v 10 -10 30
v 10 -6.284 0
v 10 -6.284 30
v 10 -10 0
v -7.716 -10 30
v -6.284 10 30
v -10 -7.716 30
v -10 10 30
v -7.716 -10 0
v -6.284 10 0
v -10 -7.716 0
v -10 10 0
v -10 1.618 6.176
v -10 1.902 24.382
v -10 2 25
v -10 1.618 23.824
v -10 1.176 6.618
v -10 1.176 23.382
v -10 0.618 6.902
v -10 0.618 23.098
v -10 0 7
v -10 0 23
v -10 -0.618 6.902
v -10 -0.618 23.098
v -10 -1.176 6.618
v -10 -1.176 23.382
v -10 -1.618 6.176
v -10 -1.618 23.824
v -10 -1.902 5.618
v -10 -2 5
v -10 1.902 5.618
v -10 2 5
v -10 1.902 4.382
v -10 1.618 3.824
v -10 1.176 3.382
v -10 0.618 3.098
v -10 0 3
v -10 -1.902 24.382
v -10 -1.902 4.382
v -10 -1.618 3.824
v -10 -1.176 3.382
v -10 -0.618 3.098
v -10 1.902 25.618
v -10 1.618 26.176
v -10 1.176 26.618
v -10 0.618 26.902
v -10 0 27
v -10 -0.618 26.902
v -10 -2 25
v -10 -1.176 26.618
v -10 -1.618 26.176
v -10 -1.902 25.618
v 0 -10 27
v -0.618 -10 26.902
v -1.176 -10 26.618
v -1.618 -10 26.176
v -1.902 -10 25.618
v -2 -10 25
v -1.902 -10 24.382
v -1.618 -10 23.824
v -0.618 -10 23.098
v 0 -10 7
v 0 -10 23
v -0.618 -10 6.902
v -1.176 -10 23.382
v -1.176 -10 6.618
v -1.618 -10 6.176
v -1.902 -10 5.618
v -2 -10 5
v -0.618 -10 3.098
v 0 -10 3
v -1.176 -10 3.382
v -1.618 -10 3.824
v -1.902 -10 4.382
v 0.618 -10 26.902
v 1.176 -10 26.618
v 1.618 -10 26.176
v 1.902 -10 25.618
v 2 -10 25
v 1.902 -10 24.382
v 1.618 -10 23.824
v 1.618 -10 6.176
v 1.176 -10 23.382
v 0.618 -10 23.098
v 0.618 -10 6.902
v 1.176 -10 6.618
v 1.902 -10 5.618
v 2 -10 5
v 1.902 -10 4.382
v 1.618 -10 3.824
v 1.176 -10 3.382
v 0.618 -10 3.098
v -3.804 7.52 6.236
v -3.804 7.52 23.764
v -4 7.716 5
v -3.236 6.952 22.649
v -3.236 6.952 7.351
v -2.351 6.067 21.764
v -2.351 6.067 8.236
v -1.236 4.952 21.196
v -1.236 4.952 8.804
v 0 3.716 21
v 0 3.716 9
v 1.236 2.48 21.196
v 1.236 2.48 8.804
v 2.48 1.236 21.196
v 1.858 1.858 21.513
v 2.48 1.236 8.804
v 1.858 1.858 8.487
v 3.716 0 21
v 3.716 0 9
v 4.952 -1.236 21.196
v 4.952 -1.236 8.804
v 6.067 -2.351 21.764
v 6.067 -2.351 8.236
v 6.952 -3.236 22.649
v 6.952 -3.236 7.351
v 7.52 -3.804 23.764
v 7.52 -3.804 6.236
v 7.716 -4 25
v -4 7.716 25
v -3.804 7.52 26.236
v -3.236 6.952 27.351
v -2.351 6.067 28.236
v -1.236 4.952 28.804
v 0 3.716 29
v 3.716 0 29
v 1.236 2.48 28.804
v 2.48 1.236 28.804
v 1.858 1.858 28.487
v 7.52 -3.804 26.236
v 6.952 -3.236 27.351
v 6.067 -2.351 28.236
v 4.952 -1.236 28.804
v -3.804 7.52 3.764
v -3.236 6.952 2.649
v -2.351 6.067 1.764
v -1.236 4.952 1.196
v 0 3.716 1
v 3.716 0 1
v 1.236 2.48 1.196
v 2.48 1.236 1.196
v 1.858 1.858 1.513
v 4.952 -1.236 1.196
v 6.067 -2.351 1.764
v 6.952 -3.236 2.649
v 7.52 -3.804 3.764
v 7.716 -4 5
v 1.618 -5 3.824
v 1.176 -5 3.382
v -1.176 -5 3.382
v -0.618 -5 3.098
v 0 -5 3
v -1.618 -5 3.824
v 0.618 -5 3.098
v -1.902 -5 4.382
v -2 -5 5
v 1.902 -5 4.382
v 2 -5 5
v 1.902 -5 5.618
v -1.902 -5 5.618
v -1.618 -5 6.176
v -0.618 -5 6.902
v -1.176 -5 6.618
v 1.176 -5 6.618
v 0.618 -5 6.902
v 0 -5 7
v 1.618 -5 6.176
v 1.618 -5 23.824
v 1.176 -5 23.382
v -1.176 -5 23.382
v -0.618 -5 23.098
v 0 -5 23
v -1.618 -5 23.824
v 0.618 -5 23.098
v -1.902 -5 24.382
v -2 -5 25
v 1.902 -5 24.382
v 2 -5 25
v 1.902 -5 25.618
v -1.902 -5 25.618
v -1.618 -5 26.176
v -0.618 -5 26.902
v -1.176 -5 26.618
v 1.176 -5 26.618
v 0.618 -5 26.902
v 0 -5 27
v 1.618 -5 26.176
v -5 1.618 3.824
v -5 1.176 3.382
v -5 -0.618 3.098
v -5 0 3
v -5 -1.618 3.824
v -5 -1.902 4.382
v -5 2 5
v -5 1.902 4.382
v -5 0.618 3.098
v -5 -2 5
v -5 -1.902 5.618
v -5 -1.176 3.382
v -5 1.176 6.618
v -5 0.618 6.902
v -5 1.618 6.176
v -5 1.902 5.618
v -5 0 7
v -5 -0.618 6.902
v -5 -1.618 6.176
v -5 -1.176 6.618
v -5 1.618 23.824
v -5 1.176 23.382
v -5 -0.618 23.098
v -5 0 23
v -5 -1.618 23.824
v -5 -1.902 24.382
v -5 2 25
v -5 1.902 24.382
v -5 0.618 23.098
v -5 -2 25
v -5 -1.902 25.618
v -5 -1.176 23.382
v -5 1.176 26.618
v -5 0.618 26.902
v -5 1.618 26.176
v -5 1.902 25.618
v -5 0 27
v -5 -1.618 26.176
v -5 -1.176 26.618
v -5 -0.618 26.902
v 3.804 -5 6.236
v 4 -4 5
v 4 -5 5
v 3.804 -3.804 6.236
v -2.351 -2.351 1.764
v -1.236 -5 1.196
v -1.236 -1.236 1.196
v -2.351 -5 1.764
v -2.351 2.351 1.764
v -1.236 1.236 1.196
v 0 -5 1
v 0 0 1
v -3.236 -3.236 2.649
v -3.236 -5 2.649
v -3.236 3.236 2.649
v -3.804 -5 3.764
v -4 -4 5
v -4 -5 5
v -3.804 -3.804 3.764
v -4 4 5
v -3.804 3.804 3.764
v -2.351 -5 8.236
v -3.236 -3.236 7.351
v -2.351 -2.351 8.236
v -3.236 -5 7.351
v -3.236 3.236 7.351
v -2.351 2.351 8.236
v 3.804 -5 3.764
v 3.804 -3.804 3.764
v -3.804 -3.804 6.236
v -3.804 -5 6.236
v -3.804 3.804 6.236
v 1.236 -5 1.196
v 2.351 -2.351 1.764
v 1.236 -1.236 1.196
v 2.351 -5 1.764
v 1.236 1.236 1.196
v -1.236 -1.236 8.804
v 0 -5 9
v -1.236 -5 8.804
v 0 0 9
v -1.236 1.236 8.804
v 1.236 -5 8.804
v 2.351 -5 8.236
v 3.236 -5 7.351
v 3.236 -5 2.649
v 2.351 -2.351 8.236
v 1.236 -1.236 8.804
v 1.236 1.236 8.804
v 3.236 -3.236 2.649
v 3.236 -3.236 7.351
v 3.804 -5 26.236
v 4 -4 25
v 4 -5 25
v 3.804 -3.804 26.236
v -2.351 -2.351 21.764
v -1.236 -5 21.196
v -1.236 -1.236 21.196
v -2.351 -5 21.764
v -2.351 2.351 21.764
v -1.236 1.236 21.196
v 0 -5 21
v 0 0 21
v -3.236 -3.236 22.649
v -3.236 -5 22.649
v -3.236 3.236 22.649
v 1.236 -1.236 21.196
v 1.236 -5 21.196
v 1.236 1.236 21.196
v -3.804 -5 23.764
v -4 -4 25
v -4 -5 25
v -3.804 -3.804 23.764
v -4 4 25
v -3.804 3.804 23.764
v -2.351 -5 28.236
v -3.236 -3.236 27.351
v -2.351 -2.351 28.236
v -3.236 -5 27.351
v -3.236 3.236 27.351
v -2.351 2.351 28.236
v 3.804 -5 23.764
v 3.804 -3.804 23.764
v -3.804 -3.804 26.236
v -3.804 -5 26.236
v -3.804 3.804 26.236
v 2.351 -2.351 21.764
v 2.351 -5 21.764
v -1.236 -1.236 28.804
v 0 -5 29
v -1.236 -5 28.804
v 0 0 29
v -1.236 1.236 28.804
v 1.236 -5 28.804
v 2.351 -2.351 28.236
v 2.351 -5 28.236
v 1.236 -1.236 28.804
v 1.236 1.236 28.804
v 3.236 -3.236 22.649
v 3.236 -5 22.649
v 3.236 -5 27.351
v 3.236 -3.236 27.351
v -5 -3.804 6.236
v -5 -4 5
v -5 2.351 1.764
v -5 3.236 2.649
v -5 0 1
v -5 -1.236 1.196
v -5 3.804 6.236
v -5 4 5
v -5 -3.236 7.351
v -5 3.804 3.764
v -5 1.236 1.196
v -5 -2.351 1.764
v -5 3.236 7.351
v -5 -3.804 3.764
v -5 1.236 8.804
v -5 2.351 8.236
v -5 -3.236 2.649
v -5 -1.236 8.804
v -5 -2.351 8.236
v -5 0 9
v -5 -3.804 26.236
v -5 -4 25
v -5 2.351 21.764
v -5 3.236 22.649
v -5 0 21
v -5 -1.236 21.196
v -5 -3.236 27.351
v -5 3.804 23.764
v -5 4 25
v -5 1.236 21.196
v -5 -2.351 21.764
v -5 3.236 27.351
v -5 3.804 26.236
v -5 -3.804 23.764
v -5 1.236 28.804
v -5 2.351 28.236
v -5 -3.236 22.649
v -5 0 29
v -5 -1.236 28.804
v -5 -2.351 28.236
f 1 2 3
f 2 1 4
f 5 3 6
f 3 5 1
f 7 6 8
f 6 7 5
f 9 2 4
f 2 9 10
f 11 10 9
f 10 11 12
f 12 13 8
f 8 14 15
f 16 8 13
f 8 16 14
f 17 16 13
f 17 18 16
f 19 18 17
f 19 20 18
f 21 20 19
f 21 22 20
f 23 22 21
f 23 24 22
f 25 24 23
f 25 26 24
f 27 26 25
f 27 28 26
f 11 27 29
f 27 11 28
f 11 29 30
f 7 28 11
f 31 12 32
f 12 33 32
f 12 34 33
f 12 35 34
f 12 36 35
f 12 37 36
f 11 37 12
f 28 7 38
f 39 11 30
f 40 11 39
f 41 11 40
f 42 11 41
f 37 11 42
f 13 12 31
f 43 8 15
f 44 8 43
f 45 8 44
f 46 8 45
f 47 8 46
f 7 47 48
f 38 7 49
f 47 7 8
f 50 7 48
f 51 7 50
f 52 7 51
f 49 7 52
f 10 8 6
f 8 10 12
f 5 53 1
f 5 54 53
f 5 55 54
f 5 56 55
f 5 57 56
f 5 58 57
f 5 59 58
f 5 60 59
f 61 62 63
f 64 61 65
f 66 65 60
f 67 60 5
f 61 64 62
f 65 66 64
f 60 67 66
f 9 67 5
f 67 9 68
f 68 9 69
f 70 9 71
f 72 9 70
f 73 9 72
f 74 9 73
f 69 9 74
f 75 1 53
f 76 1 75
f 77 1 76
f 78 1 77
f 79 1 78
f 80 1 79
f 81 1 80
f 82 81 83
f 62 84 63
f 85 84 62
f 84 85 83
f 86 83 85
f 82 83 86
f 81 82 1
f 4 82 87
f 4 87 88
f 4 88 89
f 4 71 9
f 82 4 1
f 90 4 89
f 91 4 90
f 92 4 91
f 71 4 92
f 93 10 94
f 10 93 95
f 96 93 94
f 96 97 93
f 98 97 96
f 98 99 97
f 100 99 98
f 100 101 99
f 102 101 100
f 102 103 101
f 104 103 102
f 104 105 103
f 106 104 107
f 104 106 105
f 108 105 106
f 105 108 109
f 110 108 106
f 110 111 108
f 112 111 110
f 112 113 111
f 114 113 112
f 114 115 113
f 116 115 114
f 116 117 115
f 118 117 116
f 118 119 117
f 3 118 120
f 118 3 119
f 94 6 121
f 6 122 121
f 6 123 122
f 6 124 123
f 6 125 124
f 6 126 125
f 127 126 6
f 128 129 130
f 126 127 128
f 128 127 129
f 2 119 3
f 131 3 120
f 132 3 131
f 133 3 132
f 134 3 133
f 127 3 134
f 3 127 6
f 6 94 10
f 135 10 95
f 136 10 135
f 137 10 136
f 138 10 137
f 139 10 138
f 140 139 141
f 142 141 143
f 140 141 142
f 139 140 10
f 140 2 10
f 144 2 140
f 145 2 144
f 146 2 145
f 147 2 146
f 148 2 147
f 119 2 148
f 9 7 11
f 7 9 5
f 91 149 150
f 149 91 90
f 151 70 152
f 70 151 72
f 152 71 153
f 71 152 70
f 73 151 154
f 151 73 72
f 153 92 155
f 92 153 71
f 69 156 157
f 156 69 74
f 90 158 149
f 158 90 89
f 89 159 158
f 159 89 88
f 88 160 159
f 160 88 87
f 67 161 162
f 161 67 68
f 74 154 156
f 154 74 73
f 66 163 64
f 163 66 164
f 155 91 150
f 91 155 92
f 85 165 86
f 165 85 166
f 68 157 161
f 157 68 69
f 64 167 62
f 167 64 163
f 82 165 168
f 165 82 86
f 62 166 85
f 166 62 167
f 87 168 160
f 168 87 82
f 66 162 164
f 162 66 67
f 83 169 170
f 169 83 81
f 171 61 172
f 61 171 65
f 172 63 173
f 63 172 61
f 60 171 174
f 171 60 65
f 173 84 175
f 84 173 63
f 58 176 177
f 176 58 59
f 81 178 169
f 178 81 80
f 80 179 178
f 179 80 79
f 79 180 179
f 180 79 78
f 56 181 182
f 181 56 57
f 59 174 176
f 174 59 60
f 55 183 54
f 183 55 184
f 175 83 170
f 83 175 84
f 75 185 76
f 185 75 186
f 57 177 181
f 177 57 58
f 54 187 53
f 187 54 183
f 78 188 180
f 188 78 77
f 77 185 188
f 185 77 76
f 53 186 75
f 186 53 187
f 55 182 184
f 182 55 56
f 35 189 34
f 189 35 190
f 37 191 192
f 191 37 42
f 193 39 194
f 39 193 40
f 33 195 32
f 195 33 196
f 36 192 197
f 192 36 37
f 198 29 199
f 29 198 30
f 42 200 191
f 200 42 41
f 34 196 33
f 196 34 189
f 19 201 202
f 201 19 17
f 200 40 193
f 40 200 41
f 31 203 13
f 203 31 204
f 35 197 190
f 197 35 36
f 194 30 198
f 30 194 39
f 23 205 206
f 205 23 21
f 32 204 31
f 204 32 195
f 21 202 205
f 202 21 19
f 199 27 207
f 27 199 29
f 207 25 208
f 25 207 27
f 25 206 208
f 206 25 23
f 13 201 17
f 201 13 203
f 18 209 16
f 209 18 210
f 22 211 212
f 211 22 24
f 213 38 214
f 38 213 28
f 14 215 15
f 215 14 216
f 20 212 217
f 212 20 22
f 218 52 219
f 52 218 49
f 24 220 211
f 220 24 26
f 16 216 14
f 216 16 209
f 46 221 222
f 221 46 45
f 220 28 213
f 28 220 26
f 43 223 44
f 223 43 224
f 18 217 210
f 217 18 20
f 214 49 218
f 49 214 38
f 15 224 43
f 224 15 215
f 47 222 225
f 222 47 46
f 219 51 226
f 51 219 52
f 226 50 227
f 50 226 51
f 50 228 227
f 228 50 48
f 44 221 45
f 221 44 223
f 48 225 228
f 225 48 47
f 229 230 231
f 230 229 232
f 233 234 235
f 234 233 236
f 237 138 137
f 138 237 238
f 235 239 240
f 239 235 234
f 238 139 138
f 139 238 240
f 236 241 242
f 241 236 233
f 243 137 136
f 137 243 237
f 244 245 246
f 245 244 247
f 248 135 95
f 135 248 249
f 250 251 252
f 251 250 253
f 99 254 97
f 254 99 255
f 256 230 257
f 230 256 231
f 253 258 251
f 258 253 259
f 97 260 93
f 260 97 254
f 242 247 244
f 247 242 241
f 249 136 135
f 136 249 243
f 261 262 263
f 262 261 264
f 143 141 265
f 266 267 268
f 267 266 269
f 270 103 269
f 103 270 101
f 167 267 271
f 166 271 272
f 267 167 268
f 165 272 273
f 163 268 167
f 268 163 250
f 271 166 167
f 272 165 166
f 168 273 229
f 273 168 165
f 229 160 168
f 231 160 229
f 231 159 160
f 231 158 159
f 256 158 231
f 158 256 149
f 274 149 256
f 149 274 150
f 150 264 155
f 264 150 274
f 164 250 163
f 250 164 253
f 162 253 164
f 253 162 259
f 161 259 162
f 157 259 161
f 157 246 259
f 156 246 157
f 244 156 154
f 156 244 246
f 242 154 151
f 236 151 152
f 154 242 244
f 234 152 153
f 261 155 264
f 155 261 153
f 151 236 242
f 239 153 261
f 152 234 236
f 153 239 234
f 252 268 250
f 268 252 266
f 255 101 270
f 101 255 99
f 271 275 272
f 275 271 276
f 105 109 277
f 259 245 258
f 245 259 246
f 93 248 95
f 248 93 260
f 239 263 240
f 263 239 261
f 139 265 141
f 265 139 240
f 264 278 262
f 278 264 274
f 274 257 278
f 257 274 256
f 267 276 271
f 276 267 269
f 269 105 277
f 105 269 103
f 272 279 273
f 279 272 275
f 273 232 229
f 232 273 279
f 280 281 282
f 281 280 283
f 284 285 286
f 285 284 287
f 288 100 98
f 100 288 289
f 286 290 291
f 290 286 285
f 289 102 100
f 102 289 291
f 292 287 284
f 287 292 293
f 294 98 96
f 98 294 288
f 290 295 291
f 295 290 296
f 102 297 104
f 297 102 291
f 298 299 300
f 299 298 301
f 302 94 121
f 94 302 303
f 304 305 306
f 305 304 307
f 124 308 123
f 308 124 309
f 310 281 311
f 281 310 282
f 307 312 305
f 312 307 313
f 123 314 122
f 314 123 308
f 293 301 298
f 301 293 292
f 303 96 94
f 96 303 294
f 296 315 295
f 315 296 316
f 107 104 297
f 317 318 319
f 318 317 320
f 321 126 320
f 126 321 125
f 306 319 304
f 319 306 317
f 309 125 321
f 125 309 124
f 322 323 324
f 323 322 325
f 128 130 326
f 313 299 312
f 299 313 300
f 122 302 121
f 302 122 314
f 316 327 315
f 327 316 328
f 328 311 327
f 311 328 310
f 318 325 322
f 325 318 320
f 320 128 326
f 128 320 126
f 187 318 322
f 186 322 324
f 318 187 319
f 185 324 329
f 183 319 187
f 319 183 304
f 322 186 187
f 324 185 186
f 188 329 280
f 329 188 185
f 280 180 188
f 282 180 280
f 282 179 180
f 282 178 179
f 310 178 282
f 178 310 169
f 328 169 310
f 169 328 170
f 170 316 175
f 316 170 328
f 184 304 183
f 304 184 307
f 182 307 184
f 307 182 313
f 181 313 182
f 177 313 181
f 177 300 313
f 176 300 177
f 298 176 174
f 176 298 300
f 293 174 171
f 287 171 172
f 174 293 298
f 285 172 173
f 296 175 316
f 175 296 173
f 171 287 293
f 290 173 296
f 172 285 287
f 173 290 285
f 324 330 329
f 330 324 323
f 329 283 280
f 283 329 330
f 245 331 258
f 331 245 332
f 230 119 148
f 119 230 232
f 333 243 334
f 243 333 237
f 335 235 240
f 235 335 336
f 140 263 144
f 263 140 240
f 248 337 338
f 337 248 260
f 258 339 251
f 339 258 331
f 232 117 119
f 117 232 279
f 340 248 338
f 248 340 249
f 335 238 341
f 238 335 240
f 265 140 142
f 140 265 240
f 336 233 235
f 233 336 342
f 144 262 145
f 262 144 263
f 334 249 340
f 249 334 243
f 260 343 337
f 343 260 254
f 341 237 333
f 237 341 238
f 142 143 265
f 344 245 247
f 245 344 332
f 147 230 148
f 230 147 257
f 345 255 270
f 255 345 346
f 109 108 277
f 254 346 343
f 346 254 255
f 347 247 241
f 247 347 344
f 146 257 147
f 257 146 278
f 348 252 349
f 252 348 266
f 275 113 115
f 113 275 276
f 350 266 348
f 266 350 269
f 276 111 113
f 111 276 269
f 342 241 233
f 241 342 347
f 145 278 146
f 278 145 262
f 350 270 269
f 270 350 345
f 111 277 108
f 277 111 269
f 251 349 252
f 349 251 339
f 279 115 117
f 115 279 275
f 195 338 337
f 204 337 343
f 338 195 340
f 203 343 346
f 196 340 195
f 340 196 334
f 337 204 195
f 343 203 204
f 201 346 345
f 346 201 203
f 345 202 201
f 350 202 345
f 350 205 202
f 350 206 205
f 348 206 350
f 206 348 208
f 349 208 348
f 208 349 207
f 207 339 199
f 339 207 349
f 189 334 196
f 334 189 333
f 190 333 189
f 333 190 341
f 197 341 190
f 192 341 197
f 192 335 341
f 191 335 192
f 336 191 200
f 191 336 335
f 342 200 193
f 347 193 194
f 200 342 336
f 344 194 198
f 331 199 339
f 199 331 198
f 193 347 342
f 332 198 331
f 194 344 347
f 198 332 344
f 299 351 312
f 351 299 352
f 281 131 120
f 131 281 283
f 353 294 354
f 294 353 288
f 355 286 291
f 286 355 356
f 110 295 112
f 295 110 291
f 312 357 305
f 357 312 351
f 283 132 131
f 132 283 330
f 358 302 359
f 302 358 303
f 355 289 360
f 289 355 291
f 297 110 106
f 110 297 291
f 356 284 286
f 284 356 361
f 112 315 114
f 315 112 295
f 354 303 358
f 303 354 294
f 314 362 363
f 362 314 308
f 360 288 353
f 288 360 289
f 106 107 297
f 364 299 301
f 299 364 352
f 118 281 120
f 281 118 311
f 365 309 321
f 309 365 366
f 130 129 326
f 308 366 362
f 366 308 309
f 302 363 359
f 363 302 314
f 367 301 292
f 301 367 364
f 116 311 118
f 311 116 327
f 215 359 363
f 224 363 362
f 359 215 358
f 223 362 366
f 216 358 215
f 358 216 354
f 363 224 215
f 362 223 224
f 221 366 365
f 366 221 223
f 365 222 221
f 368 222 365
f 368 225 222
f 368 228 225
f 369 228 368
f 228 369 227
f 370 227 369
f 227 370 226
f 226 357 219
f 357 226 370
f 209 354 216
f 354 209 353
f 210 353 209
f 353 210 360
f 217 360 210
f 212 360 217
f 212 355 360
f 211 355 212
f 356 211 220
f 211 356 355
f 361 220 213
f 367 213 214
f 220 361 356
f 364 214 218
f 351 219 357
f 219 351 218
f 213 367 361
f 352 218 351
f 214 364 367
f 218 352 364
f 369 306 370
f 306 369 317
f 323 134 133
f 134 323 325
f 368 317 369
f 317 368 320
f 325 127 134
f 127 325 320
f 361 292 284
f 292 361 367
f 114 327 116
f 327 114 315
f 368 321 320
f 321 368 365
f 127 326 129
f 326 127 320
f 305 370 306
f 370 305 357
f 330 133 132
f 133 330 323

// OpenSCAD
difference(){
	translate([-10,-10,0])cube([20,20,30]);
translate([16,16,0]) rotate([0,0,45])translate([-20,-20,-1]) cube([40,40,40]);
translate([-23,-23,0]) rotate([0,0,45])translate([-20,-20,-1]) cube([40,40,40]);
translate([0,-20,5]) rotate([0,90,90]) cylinder(h = 50, r=2, $fn=20);
translate([0,-20,25]) rotate([0,90,90]) cylinder(h = 50, r=2, $fn=20);
translate([-20,0,5]) rotate([0,90,0]) cylinder(h = 50, r=2, $fn=20);
translate([-20,0,25]) rotate([0,90,0]) cylinder(h = 50, r=2, $fn=20);

translate([0,-5,5]) rotate([0,90,90]) cylinder(h = 50, r=4, $fn=20);
translate([0,-5,25]) rotate([0,90,90]) cylinder(h = 50, r=4, $fn=20);
translate([-5,0,5]) rotate([0,90,0]) cylinder(h = 50, r=4, $fn=20);
translate([-5,0,25]) rotate([0,90,0]) cylinder(h = 50, r=4, $fn=20);
}
